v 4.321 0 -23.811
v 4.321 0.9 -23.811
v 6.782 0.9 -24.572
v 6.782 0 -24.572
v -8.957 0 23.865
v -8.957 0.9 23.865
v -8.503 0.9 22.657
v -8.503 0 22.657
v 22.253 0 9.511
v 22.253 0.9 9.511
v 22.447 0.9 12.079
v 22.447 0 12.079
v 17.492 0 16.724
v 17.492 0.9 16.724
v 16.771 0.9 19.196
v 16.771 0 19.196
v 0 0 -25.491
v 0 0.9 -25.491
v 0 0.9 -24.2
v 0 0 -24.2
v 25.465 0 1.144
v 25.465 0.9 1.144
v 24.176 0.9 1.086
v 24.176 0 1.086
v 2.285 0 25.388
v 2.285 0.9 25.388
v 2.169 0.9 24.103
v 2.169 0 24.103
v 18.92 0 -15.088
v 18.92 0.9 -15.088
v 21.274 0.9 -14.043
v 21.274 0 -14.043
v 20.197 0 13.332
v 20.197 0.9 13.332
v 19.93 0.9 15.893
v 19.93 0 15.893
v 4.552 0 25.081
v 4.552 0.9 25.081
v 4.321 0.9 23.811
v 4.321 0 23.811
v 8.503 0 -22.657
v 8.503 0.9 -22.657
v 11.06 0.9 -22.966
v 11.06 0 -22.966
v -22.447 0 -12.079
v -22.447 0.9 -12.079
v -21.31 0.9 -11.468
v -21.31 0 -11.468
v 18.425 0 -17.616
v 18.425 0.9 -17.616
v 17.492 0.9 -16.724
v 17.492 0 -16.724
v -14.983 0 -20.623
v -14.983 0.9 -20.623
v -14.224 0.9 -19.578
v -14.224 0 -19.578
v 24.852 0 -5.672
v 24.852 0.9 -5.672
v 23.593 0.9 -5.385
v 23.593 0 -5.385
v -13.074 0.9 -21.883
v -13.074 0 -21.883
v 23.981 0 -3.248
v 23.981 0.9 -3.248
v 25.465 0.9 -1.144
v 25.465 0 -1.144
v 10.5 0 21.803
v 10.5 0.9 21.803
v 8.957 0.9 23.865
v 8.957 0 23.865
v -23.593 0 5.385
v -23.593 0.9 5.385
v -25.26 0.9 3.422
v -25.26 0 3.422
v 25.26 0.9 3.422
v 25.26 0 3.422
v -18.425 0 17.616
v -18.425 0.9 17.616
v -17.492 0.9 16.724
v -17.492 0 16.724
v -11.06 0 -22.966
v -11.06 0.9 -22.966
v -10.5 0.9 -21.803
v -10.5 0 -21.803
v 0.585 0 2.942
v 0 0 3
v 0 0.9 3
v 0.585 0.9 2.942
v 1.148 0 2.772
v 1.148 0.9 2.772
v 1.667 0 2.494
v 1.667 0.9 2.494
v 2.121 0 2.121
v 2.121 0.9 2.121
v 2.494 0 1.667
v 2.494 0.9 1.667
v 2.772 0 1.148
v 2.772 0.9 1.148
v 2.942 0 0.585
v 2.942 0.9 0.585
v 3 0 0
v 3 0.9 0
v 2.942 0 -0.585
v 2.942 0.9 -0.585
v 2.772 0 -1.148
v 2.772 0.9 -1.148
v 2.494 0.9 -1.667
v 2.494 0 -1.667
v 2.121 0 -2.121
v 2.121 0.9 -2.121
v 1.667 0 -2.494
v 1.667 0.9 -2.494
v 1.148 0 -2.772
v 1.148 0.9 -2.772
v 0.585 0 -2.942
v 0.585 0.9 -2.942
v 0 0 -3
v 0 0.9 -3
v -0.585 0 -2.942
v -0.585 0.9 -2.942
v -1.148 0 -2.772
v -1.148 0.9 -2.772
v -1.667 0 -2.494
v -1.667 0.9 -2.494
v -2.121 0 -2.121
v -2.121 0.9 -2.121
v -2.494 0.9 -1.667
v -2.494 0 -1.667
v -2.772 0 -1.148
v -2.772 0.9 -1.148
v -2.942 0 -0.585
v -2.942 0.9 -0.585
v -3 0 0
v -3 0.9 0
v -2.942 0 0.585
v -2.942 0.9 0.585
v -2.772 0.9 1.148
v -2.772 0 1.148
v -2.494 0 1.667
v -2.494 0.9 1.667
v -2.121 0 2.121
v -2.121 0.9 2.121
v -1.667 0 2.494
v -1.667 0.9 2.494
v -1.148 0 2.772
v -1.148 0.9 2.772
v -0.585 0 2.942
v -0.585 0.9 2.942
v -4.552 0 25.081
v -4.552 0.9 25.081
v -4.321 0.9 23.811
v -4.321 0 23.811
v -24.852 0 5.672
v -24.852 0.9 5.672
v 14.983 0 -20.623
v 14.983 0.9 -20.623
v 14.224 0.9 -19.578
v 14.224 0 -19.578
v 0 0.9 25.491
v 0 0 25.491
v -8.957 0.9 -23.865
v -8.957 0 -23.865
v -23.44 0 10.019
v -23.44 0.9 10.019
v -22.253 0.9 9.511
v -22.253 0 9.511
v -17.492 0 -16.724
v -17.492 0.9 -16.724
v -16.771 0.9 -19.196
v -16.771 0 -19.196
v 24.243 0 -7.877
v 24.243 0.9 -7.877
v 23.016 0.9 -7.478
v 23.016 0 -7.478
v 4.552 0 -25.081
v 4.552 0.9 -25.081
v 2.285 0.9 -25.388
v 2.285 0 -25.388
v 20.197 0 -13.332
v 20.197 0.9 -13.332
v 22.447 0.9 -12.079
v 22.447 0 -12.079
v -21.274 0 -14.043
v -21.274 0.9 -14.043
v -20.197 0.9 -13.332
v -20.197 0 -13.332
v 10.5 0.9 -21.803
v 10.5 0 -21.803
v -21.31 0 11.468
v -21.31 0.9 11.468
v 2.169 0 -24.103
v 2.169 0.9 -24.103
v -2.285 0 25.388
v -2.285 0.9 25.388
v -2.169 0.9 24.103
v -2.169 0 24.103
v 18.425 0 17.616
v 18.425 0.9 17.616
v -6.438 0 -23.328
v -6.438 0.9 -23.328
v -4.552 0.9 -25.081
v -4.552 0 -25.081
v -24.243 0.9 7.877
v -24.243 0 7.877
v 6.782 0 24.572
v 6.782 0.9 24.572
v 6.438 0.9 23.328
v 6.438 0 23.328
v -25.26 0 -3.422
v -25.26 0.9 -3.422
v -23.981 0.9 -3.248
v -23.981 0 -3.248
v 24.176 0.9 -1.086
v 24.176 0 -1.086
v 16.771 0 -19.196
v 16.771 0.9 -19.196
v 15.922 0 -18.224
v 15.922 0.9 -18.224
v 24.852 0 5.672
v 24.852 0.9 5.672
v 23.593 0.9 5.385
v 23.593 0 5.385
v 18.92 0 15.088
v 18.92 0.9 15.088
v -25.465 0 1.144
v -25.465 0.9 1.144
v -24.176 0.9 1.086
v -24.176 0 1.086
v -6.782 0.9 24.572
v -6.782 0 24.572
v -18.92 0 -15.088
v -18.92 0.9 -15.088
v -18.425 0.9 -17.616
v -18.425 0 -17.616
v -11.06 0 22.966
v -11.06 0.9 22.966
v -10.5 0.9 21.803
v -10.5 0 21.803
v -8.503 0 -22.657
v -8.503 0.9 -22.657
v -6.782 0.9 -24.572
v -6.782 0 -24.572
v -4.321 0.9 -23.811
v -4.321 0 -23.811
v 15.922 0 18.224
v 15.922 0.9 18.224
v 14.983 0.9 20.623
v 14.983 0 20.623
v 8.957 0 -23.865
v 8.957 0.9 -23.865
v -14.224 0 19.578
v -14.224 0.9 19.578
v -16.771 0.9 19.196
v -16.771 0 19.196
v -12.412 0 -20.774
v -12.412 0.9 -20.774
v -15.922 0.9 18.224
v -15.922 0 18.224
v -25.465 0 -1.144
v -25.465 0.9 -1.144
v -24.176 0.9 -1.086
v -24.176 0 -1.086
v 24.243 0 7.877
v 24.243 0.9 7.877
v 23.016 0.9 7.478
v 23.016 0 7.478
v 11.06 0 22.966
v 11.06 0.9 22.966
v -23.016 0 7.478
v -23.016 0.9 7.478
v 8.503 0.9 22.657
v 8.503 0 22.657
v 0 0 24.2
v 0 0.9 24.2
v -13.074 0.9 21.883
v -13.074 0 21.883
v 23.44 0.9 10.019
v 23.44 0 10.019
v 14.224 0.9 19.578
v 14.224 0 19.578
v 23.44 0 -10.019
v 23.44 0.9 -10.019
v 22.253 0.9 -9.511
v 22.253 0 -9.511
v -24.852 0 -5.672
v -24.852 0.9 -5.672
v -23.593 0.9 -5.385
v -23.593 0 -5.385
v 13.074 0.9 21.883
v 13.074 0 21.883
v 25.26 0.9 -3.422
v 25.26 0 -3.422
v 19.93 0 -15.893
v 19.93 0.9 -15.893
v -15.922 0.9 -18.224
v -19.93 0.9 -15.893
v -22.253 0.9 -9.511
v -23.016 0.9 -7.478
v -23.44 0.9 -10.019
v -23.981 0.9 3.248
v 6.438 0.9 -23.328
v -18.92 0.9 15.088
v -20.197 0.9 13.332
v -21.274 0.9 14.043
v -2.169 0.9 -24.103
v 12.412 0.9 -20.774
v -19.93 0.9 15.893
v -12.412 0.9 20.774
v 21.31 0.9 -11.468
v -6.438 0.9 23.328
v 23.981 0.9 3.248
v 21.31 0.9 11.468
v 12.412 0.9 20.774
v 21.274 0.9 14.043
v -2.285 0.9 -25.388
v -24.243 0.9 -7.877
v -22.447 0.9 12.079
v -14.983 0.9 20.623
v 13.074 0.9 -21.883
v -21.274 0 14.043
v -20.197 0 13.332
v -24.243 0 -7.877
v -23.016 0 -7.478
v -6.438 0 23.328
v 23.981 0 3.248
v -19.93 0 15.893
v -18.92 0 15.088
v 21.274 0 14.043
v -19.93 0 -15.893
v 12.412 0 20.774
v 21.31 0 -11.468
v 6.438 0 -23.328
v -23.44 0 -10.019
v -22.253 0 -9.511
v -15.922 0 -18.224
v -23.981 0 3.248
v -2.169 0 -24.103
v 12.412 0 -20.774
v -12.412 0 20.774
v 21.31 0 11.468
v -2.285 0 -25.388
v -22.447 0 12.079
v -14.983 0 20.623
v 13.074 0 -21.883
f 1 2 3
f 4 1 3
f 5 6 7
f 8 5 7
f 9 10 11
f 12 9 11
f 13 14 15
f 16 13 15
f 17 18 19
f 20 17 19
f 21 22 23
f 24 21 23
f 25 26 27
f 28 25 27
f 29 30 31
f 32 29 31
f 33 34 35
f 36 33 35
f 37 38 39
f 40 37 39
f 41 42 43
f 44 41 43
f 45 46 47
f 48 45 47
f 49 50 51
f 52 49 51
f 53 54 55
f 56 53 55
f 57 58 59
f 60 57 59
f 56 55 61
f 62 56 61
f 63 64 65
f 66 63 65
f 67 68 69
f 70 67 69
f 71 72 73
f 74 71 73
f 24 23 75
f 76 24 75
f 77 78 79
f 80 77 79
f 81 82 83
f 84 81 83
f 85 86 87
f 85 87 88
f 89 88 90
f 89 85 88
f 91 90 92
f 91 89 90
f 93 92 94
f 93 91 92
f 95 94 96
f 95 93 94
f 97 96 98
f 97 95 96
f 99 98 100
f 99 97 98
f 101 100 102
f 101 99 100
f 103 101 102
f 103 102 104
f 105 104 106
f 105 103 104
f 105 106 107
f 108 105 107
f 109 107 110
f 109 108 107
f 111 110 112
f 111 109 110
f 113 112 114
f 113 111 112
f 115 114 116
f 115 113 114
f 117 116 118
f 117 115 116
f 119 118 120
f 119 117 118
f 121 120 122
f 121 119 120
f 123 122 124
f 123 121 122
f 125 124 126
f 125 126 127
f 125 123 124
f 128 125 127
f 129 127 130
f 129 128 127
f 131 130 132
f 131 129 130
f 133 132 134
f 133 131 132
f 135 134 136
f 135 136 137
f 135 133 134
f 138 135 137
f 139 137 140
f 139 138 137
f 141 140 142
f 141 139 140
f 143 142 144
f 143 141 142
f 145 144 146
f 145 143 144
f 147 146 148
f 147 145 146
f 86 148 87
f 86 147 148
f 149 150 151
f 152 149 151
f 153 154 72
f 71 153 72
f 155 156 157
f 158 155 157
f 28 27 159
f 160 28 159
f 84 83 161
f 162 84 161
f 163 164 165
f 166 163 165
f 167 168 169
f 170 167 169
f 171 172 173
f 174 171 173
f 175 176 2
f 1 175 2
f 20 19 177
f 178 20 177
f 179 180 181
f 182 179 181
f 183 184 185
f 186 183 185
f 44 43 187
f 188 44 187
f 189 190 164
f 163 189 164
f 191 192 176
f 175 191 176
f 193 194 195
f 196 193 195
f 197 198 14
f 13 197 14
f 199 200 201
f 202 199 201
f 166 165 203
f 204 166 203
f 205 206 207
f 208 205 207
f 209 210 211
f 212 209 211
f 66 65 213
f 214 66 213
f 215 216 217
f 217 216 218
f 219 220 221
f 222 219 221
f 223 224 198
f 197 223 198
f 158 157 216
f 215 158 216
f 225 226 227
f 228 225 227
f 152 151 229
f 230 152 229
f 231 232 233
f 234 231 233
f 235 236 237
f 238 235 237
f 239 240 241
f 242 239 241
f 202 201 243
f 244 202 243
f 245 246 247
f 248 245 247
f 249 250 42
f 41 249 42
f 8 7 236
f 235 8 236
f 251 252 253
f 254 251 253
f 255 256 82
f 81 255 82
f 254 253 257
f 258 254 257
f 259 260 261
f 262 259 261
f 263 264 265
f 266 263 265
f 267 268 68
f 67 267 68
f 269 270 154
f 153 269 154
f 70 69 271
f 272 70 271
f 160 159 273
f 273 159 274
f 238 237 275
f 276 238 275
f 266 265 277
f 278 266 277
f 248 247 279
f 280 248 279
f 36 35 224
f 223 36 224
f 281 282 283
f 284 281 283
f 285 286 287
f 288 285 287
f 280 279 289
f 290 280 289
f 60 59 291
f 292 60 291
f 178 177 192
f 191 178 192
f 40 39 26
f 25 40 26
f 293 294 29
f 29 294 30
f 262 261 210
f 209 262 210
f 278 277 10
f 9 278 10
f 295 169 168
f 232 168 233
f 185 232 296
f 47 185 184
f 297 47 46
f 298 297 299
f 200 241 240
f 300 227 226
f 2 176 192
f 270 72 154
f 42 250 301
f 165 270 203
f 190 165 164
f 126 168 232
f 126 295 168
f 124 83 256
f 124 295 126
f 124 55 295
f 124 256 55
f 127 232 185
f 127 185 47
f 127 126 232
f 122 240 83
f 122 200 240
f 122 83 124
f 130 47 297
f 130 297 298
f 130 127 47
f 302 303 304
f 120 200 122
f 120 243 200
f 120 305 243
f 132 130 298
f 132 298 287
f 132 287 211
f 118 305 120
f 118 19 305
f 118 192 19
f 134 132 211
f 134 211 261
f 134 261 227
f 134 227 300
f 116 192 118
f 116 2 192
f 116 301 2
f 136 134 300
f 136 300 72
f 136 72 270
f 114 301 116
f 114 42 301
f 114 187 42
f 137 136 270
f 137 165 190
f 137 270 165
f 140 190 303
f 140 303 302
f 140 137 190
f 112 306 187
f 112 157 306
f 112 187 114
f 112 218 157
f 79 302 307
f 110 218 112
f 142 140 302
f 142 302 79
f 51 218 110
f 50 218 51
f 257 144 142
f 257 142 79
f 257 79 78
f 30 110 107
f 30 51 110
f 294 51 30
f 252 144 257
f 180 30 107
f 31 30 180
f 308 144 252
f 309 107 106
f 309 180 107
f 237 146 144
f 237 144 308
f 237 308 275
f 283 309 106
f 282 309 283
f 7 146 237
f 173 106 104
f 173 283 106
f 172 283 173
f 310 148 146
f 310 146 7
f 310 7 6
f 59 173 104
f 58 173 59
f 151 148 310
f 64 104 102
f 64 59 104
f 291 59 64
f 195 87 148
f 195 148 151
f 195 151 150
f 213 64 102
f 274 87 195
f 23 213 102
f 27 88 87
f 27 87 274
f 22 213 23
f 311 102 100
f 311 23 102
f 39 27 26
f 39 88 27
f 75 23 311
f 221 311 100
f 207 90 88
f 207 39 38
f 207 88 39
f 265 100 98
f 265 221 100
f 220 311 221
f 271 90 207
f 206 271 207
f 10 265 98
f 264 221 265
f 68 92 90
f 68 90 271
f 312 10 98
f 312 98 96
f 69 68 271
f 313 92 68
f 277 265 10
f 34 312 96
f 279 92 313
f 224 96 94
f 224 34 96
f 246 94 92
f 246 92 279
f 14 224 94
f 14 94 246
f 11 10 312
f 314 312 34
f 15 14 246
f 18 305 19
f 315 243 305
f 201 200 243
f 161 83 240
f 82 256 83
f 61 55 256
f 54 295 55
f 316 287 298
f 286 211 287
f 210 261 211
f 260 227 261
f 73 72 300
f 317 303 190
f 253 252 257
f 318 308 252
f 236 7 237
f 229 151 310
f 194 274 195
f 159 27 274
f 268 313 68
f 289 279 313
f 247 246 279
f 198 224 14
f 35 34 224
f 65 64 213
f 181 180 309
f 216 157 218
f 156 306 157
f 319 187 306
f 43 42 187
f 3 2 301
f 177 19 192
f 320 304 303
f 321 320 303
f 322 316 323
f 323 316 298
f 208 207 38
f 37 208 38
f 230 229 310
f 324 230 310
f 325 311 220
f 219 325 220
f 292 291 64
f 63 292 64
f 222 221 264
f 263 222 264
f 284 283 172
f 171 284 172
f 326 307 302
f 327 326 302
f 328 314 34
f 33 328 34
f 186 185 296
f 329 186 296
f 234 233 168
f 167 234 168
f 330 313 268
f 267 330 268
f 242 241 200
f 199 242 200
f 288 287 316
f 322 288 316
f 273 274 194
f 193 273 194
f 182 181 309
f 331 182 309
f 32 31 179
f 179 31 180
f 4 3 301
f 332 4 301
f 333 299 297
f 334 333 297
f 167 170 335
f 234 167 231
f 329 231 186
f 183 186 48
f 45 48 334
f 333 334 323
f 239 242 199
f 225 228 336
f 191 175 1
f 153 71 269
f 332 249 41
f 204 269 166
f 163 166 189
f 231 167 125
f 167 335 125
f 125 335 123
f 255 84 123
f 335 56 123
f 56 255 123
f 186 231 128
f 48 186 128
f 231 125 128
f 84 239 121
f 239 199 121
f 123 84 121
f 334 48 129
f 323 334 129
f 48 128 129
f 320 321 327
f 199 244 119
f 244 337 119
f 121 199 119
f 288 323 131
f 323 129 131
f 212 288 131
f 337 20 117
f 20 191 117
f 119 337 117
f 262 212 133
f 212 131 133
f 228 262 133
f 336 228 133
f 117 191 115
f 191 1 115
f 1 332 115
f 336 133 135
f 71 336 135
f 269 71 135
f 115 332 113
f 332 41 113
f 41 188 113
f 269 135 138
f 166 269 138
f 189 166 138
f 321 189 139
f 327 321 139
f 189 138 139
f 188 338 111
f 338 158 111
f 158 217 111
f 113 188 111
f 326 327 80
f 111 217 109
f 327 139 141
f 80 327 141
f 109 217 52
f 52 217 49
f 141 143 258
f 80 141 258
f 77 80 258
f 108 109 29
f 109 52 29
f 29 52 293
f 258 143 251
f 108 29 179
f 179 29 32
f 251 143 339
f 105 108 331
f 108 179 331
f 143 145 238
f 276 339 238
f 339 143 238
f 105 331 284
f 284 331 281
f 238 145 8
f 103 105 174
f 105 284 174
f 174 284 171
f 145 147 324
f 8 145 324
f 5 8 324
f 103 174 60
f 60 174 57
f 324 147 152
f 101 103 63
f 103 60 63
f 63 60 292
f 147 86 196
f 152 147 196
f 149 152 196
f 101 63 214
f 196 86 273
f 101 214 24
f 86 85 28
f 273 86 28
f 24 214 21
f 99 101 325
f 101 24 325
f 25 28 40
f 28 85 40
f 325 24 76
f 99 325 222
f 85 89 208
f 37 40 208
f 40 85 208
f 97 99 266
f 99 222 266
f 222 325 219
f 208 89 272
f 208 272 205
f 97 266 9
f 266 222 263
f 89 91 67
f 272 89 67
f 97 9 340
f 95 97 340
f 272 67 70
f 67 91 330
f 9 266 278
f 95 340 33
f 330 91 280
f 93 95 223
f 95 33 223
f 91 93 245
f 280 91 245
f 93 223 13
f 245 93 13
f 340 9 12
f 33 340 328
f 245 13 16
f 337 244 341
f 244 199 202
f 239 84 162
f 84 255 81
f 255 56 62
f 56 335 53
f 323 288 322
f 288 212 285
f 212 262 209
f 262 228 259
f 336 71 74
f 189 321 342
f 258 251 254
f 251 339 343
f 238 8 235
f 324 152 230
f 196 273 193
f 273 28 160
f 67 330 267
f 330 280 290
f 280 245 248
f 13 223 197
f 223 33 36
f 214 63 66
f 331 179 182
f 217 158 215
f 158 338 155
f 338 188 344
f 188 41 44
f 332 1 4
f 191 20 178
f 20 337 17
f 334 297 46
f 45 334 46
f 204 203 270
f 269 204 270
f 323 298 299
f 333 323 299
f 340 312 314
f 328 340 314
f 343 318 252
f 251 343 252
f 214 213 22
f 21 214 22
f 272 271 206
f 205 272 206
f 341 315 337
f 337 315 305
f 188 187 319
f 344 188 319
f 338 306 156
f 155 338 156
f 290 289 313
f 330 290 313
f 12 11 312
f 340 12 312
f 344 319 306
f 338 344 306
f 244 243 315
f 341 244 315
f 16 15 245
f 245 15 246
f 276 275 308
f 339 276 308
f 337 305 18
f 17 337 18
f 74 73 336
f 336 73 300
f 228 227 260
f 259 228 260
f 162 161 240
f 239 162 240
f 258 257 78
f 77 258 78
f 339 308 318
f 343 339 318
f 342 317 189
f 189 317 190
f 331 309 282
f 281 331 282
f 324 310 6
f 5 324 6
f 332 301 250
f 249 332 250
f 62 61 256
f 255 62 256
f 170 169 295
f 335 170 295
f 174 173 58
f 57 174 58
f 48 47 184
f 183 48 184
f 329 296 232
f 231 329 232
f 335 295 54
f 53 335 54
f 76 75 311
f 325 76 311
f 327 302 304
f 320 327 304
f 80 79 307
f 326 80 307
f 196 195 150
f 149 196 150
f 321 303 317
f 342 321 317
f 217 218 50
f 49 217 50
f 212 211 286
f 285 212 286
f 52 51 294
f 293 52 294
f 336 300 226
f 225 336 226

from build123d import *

# Parameters (mm, degrees)
SKETCH_1_R               = 25.5
SKETCH_1_R_2             = 3
EXTRUDE_1_DEPTH          = 0.9
CUT_EXTRUDE_2_DEPTH      = 0.9
PATTERN_CIRCULAR_1_COUNT = 70


with BuildPart() as part:
    # 스케치1 → 보스-돌출1 (new body)
    with BuildSketch(Plane(origin=(0, 0, 0), x_dir=(1, 0, 0), z_dir=(0, 1, 0))):
        with Locations(Location((0, 0, 0), (0, 0, 270))):
            Circle(SKETCH_1_R)
        with Locations(Location((0, 0, 0), (0, 0, 270))):
            Circle(SKETCH_1_R_2, mode=Mode.SUBTRACT)
    extrude(amount=EXTRUDE_1_DEPTH)

    # 스케치3 → 컷-돌출2 (cut)
    with BuildSketch(Plane(origin=(0, 0.9, 0), x_dir=(1, 0, 0), z_dir=(0, 1, 0))):
        Polygon((0, 25.5), (0, 24.2), (3.797752252, 26.174934679), (0, 26.174934679), align=None)
    cut_extrude_2 = extrude(amount=-CUT_EXTRUDE_2_DEPTH, mode=Mode.SUBTRACT)

    # 원형 패턴1: 컷-돌출2 ×70 about axis
    pattern_circular_1_axis = Axis((0, 0, 0), (0, 1, 0))
    for i in range(1, PATTERN_CIRCULAR_1_COUNT):
        add(cut_extrude_2.rotate(pattern_circular_1_axis, i * 360 / PATTERN_CIRCULAR_1_COUNT), mode=Mode.SUBTRACT)


solid = part.part
